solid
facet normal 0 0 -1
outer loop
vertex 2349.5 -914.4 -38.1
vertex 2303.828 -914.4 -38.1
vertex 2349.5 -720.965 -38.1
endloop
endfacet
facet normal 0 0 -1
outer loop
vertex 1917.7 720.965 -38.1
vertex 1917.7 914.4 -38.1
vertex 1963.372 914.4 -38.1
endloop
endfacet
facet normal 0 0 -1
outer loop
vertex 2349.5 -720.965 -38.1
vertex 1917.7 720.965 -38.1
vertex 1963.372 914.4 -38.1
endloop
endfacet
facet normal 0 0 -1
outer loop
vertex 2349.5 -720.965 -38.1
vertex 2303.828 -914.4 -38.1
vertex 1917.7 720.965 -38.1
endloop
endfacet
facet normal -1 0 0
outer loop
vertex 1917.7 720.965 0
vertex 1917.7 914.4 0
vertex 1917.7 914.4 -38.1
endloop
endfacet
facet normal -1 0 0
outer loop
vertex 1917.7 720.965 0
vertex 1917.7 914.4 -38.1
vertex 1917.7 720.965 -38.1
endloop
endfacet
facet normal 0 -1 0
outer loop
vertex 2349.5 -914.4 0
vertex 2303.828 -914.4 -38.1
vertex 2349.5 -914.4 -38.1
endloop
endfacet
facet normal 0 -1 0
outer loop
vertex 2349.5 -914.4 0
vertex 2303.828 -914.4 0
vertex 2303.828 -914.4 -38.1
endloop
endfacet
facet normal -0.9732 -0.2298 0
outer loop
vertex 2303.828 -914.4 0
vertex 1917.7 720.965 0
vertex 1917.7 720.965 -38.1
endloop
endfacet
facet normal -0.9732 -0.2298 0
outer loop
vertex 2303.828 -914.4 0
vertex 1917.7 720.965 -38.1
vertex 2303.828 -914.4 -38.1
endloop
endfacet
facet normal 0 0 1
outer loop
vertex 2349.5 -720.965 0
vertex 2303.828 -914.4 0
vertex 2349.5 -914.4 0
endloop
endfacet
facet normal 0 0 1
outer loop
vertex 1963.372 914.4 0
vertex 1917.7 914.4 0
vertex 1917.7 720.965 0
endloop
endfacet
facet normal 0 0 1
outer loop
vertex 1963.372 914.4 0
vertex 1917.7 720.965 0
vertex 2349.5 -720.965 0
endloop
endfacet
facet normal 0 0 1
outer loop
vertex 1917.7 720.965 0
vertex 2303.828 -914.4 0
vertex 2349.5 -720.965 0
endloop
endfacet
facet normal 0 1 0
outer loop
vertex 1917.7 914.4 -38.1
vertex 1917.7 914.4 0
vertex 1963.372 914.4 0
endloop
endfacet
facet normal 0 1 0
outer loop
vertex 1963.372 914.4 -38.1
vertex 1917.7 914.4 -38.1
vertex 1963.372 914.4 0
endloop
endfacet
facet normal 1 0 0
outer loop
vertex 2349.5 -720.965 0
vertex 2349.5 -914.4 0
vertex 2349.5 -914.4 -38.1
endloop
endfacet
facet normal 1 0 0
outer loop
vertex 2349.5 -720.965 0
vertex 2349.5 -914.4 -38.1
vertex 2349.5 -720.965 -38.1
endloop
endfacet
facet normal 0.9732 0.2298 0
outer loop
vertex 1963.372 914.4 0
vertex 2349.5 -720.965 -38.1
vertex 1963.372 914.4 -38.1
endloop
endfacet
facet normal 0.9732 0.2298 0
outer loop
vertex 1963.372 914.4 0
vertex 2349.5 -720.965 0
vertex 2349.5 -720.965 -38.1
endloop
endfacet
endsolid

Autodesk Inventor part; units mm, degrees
ref_plane "YZ Plane" through (0, 0, 0) normal (1, 0, 0) x (0, 1, 0)
ref_plane "XZ Plane" through (0, 0, 0) normal (0, 1, 0) x (-1, 0, 0)
ref_plane "XY Plane" through (0, 0, 0) normal (0, 0, 1) x (1, 0, 0)
sketch "Sketch1" plane through (0, 0, 0) normal (0, 0, 1) x (1, 0, 0)
  line L0 (88.9, 914.4) -> (2349.5, 914.4) projected
  line L1 (88.9, -914.4) -> (88.9, 914.4) projected
  line L2 (88.9, -914.4) -> (2349.5, -914.4) projected
  line L3 (520.7, -914.4) -> (520.7, 914.4) projected
  line L4 (2349.5, -914.4) -> (2349.5, 914.4) projected
  line L5 (1917.7, 914.4) -> (1917.7, -914.4) projected
  line L6 (520.7, 743.6248) -> (520.7, -914.4)
  line L7 (88.9, -720.9648) -> (88.9, 914.4)
  line L8 (1917.7, 720.9648) -> (2303.8278, -914.4)
  line L9 (2349.5, -720.9648) -> (1963.3722, 914.4)
  line L10 (88.9, 914.4) -> (520.7, 914.4)
  line L11 (88.9, 914.4) -> (520.7, 914.4)
  line L12 (2303.8278, -914.4) -> (2349.5, -914.4)
  line L13 (2349.5, -720.9648) -> (2349.5, -914.4)
  line L14 (1917.7, 720.9648) -> (1917.7, 914.4)
  line L15 (1917.7, 914.4) -> (1963.3722, 914.4)
  line L16 (520.7, -914.4) -> (88.9, -914.4)
  line L17 (88.9, -914.4) -> (88.9, -720.9648)
  line L18 (88.9, 914.4) -> (520.7, 914.4)
  line L19 (520.7, 738.408) -> (520.7, 914.4)
  point P0 (0, 0)
extrude "Extrusion1" add sketch "Sketch1" against normal blind 38.1 contours L0 L9 L4 L2 L8 L5
properties part number "fside1"
